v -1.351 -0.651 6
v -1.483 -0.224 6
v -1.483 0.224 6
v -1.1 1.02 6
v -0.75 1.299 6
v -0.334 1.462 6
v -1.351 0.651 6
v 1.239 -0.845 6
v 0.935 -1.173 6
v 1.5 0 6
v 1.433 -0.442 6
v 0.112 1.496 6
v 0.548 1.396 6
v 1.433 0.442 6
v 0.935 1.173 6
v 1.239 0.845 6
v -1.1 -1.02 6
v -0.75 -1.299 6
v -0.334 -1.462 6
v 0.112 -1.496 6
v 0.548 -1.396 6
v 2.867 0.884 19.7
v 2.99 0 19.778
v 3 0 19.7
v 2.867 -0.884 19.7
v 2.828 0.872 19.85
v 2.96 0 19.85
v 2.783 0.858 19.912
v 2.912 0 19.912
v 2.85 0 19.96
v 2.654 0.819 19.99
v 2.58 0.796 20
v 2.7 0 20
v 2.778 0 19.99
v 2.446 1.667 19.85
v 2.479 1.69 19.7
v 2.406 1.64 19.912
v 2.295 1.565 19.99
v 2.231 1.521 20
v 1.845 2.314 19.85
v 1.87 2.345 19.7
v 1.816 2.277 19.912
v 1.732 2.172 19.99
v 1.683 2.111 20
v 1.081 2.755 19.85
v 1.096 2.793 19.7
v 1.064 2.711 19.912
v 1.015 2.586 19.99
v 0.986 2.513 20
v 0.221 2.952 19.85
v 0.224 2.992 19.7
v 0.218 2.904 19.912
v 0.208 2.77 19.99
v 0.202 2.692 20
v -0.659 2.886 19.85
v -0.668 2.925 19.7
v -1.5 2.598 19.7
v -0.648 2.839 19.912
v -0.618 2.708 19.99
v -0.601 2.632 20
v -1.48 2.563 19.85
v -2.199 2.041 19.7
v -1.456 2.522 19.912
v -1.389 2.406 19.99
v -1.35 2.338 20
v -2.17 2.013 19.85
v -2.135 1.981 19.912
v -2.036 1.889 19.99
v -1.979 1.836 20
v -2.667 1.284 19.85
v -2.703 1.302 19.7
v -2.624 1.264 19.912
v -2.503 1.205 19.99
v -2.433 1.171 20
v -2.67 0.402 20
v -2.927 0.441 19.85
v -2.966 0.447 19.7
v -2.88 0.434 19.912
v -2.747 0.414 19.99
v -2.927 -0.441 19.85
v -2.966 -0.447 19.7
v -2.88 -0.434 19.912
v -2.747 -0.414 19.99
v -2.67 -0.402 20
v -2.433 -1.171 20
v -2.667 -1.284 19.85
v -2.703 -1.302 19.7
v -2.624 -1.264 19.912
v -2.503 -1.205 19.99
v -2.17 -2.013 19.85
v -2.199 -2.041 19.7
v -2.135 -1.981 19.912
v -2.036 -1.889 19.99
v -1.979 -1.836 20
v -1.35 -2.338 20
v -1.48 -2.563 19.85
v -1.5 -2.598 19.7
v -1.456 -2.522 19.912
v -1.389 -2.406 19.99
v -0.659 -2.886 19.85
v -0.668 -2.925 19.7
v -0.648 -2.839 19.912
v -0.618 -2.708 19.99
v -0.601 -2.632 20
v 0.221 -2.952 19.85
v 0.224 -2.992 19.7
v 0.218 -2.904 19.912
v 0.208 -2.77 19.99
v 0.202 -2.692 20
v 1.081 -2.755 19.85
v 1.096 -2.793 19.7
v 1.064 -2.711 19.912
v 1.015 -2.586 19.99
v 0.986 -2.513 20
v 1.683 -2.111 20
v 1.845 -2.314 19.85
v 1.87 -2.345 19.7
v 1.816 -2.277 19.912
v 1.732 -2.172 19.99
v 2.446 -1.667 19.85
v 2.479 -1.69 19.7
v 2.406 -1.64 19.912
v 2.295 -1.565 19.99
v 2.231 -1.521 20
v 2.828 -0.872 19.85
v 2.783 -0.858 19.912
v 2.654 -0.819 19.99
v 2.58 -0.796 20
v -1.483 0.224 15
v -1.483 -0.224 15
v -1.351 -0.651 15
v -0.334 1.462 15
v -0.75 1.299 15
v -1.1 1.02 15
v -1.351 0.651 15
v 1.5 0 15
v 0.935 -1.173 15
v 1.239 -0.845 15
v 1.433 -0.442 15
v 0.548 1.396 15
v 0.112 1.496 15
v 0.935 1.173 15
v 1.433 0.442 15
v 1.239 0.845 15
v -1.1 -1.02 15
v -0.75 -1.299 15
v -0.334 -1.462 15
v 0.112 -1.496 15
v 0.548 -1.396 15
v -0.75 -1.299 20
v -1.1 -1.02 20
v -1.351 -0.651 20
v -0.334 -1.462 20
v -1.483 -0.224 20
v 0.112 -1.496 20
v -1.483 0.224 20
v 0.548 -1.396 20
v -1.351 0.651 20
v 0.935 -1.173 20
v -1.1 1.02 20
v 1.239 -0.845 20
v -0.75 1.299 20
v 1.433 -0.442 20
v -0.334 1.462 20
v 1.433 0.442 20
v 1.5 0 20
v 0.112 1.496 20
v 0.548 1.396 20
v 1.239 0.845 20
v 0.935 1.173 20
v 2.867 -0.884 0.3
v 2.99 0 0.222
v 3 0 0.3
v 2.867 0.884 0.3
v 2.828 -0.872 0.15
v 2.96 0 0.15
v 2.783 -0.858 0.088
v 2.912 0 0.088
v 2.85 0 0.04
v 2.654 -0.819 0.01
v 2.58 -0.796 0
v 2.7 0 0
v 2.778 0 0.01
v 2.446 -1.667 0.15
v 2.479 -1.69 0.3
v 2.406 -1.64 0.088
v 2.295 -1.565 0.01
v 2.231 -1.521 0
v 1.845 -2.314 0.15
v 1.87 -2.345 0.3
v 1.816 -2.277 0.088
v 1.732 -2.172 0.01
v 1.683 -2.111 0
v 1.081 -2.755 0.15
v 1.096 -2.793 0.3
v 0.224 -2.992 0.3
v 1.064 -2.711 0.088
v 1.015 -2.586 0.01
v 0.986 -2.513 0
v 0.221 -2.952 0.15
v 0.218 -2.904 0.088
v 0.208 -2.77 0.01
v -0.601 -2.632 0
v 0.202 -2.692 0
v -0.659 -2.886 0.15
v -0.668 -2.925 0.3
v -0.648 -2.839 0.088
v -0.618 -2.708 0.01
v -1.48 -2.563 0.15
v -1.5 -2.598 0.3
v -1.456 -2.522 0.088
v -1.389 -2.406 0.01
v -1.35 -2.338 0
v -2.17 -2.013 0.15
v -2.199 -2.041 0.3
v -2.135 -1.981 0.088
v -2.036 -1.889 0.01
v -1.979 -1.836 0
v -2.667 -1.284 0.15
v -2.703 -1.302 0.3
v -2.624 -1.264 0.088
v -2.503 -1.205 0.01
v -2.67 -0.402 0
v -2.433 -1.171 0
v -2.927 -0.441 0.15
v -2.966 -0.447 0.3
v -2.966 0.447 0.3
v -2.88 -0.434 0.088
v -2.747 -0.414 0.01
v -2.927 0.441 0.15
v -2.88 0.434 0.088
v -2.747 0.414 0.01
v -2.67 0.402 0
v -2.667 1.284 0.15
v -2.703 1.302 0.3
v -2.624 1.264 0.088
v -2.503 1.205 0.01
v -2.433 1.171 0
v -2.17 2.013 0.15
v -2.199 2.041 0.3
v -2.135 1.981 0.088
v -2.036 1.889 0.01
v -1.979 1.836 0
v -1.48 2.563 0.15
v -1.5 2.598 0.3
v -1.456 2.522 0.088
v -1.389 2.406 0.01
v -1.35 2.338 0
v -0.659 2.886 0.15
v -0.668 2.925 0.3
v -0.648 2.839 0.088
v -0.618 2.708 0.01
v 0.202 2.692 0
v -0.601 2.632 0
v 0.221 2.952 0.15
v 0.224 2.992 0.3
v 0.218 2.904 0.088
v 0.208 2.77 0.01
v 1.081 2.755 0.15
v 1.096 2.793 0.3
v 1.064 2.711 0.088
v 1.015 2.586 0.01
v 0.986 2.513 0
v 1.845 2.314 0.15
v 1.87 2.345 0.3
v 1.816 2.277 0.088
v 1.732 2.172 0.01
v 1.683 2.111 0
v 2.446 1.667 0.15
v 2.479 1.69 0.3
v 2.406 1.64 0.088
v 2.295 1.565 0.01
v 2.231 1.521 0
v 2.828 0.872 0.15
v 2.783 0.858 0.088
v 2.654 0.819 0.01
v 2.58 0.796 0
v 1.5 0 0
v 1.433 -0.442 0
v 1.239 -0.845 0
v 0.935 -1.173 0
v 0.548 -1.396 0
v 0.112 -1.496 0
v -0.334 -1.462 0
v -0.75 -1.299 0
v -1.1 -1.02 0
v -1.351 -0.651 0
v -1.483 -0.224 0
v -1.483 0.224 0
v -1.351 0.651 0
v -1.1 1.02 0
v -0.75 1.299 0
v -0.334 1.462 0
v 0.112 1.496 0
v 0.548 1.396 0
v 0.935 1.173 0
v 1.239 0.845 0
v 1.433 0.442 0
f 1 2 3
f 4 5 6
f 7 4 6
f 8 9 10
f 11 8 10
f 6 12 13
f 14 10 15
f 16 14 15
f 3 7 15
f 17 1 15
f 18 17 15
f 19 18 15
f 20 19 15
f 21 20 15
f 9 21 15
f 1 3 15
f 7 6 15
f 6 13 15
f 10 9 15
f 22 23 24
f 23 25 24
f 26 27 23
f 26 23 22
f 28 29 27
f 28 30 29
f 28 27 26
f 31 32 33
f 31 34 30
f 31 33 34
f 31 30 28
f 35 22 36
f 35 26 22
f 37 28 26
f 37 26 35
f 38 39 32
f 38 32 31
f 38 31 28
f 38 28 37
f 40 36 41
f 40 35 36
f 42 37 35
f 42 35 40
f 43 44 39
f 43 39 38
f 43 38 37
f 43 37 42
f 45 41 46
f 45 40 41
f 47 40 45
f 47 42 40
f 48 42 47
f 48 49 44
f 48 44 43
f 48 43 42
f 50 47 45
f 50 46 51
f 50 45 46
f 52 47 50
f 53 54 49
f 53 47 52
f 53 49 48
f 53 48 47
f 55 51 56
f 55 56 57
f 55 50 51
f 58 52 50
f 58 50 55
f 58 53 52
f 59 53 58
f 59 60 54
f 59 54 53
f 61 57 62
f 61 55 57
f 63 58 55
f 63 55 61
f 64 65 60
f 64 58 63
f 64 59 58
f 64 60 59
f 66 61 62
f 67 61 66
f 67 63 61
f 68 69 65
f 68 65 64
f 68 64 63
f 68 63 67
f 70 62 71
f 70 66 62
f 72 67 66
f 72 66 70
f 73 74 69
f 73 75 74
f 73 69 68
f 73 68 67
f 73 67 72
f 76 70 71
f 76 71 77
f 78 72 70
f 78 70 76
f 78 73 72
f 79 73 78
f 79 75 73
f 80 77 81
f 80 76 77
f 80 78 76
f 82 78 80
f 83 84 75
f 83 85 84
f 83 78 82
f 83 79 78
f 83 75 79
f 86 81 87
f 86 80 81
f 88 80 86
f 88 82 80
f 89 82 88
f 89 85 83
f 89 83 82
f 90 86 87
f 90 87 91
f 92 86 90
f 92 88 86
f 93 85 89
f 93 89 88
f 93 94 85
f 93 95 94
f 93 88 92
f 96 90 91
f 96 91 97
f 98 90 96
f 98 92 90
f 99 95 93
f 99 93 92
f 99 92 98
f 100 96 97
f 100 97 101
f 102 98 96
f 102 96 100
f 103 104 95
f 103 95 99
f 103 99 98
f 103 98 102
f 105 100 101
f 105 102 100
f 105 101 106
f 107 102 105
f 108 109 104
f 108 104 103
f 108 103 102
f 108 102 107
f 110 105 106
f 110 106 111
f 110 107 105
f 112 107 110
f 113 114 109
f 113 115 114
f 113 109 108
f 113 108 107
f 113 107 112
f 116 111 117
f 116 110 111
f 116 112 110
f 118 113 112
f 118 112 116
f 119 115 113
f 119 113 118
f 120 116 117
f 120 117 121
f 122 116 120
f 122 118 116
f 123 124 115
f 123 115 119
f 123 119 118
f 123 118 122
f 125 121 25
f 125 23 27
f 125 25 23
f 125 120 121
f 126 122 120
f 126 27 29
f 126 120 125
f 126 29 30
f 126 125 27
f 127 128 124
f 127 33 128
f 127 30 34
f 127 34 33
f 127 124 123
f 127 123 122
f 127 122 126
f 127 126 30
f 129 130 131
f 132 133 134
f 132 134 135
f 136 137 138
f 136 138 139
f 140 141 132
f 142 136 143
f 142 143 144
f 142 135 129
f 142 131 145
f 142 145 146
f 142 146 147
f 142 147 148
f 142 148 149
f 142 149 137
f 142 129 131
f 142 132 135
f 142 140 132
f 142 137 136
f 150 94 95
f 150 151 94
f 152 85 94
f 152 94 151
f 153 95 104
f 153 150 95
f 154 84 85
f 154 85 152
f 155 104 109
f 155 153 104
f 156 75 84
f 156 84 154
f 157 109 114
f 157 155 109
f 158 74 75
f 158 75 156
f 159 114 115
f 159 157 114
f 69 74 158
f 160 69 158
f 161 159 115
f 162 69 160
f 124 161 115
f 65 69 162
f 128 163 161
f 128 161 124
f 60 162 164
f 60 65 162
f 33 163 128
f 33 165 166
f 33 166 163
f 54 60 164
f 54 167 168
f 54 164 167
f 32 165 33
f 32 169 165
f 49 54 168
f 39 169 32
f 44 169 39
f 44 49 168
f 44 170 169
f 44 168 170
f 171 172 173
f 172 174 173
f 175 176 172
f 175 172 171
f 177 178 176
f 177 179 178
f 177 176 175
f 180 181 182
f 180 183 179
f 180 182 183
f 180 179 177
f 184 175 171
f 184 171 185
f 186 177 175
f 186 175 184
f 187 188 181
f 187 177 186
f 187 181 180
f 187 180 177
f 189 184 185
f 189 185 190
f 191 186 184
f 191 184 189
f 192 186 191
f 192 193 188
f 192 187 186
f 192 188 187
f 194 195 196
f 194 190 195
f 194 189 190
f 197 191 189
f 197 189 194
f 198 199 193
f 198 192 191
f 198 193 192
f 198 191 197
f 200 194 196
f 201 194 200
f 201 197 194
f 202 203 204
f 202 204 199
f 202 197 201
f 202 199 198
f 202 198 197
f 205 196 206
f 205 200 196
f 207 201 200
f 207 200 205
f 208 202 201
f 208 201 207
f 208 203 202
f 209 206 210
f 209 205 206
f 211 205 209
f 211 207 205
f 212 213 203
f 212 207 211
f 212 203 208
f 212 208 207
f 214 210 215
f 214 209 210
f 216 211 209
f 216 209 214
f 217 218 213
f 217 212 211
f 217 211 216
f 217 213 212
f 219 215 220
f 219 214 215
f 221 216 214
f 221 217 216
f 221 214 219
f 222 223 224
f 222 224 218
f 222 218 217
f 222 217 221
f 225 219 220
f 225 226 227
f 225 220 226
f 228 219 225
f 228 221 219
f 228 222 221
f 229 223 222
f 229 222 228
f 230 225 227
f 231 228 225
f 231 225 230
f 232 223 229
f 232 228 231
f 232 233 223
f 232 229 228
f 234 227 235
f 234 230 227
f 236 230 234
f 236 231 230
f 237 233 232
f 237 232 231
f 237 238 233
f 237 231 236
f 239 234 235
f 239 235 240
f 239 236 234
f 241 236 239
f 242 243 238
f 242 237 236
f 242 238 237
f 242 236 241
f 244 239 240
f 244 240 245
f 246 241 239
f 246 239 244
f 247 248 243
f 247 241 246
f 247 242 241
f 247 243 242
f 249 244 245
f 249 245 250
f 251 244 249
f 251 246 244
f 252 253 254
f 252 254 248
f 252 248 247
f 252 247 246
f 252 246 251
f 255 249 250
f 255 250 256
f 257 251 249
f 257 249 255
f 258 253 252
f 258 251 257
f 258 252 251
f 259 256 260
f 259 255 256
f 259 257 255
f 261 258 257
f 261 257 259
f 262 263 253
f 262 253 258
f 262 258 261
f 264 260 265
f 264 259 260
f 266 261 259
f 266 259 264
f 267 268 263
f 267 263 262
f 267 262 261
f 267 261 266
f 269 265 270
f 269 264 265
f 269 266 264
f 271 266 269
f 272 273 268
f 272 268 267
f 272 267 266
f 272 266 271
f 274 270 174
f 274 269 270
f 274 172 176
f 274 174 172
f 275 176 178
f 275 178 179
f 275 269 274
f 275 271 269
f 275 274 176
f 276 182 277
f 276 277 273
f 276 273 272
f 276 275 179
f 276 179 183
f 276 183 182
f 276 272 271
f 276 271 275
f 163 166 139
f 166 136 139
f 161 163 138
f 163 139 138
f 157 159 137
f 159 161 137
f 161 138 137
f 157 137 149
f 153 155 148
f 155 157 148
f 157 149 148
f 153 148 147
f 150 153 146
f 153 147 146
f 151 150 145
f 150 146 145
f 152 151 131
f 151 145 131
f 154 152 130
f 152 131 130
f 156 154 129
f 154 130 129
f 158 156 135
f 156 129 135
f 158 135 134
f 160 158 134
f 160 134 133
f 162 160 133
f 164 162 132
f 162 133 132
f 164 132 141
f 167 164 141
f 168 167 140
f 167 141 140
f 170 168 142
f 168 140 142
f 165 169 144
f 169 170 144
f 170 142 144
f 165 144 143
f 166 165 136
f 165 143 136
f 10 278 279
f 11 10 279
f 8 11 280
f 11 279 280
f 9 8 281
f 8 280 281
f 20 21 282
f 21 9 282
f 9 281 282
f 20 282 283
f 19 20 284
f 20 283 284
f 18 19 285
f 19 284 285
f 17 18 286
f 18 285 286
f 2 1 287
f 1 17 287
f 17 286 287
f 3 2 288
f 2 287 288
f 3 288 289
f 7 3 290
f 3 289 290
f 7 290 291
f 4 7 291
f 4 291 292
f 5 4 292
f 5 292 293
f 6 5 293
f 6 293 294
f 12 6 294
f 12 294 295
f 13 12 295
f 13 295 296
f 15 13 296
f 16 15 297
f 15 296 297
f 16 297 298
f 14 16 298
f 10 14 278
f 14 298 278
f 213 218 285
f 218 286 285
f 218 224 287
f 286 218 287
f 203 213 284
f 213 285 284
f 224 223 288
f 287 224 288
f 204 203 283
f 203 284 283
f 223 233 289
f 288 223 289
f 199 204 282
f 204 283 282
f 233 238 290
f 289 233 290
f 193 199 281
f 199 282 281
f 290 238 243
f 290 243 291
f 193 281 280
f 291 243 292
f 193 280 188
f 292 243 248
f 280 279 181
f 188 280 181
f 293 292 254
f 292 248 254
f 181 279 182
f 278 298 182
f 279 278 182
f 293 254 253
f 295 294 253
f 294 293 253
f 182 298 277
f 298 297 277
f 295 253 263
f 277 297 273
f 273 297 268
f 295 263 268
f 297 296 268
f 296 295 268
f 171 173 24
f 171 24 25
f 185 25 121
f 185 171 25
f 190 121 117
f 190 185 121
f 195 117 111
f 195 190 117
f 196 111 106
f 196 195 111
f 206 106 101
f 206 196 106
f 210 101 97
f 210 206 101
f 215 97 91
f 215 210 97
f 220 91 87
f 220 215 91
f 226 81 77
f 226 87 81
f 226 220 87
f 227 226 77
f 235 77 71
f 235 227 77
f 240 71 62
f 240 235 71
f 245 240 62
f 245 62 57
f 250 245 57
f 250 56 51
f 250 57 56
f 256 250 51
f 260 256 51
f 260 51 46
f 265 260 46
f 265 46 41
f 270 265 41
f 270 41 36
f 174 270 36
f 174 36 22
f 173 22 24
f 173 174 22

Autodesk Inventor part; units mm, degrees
ref_plane "YZ Plane" through (0, 0, 0) normal (1, 0, 0) x (0, 1, 0)
ref_plane "XZ Plane" through (0, 0, 0) normal (0, 1, 0) x (-1, 0, 0)
ref_plane "XY Plane" through (0, 0, 0) normal (0, 0, 1) x (1, 0, 0)
sketch "スケッチ1" plane through (0, 0, 0) normal (0, 0, 1) x (1, 0, 0)
  circle A0 centre (0, 0) radius 3
  circle A1 centre (0, 0) radius 1.5
  dimension "d0" = 6
  dimension "d1" = 3
extrude "押し出し1" add sketch "スケッチ1" along normal blind 20
fillet "フィレット1" radius 0.3 2 edges at (-3, 0, 20) (-3, 0, 0)
thread "ねじ1" size "M3x0.5" class "6H" standard "ANSI Metric M Profile" length 100
extrude "押し出し2" add sketch "スケッチ1" along normal blind 15 contours A1
extrude "押し出し3" cut sketch "スケッチ1" along normal blind 6 contours A1
thread "ねじ2" size "M3x0.5" class "6H" standard "ANSI Metric M Profile" full length
properties part number "スペーサーM3L20アルミ" material "アルミニウム 2014-T4"
